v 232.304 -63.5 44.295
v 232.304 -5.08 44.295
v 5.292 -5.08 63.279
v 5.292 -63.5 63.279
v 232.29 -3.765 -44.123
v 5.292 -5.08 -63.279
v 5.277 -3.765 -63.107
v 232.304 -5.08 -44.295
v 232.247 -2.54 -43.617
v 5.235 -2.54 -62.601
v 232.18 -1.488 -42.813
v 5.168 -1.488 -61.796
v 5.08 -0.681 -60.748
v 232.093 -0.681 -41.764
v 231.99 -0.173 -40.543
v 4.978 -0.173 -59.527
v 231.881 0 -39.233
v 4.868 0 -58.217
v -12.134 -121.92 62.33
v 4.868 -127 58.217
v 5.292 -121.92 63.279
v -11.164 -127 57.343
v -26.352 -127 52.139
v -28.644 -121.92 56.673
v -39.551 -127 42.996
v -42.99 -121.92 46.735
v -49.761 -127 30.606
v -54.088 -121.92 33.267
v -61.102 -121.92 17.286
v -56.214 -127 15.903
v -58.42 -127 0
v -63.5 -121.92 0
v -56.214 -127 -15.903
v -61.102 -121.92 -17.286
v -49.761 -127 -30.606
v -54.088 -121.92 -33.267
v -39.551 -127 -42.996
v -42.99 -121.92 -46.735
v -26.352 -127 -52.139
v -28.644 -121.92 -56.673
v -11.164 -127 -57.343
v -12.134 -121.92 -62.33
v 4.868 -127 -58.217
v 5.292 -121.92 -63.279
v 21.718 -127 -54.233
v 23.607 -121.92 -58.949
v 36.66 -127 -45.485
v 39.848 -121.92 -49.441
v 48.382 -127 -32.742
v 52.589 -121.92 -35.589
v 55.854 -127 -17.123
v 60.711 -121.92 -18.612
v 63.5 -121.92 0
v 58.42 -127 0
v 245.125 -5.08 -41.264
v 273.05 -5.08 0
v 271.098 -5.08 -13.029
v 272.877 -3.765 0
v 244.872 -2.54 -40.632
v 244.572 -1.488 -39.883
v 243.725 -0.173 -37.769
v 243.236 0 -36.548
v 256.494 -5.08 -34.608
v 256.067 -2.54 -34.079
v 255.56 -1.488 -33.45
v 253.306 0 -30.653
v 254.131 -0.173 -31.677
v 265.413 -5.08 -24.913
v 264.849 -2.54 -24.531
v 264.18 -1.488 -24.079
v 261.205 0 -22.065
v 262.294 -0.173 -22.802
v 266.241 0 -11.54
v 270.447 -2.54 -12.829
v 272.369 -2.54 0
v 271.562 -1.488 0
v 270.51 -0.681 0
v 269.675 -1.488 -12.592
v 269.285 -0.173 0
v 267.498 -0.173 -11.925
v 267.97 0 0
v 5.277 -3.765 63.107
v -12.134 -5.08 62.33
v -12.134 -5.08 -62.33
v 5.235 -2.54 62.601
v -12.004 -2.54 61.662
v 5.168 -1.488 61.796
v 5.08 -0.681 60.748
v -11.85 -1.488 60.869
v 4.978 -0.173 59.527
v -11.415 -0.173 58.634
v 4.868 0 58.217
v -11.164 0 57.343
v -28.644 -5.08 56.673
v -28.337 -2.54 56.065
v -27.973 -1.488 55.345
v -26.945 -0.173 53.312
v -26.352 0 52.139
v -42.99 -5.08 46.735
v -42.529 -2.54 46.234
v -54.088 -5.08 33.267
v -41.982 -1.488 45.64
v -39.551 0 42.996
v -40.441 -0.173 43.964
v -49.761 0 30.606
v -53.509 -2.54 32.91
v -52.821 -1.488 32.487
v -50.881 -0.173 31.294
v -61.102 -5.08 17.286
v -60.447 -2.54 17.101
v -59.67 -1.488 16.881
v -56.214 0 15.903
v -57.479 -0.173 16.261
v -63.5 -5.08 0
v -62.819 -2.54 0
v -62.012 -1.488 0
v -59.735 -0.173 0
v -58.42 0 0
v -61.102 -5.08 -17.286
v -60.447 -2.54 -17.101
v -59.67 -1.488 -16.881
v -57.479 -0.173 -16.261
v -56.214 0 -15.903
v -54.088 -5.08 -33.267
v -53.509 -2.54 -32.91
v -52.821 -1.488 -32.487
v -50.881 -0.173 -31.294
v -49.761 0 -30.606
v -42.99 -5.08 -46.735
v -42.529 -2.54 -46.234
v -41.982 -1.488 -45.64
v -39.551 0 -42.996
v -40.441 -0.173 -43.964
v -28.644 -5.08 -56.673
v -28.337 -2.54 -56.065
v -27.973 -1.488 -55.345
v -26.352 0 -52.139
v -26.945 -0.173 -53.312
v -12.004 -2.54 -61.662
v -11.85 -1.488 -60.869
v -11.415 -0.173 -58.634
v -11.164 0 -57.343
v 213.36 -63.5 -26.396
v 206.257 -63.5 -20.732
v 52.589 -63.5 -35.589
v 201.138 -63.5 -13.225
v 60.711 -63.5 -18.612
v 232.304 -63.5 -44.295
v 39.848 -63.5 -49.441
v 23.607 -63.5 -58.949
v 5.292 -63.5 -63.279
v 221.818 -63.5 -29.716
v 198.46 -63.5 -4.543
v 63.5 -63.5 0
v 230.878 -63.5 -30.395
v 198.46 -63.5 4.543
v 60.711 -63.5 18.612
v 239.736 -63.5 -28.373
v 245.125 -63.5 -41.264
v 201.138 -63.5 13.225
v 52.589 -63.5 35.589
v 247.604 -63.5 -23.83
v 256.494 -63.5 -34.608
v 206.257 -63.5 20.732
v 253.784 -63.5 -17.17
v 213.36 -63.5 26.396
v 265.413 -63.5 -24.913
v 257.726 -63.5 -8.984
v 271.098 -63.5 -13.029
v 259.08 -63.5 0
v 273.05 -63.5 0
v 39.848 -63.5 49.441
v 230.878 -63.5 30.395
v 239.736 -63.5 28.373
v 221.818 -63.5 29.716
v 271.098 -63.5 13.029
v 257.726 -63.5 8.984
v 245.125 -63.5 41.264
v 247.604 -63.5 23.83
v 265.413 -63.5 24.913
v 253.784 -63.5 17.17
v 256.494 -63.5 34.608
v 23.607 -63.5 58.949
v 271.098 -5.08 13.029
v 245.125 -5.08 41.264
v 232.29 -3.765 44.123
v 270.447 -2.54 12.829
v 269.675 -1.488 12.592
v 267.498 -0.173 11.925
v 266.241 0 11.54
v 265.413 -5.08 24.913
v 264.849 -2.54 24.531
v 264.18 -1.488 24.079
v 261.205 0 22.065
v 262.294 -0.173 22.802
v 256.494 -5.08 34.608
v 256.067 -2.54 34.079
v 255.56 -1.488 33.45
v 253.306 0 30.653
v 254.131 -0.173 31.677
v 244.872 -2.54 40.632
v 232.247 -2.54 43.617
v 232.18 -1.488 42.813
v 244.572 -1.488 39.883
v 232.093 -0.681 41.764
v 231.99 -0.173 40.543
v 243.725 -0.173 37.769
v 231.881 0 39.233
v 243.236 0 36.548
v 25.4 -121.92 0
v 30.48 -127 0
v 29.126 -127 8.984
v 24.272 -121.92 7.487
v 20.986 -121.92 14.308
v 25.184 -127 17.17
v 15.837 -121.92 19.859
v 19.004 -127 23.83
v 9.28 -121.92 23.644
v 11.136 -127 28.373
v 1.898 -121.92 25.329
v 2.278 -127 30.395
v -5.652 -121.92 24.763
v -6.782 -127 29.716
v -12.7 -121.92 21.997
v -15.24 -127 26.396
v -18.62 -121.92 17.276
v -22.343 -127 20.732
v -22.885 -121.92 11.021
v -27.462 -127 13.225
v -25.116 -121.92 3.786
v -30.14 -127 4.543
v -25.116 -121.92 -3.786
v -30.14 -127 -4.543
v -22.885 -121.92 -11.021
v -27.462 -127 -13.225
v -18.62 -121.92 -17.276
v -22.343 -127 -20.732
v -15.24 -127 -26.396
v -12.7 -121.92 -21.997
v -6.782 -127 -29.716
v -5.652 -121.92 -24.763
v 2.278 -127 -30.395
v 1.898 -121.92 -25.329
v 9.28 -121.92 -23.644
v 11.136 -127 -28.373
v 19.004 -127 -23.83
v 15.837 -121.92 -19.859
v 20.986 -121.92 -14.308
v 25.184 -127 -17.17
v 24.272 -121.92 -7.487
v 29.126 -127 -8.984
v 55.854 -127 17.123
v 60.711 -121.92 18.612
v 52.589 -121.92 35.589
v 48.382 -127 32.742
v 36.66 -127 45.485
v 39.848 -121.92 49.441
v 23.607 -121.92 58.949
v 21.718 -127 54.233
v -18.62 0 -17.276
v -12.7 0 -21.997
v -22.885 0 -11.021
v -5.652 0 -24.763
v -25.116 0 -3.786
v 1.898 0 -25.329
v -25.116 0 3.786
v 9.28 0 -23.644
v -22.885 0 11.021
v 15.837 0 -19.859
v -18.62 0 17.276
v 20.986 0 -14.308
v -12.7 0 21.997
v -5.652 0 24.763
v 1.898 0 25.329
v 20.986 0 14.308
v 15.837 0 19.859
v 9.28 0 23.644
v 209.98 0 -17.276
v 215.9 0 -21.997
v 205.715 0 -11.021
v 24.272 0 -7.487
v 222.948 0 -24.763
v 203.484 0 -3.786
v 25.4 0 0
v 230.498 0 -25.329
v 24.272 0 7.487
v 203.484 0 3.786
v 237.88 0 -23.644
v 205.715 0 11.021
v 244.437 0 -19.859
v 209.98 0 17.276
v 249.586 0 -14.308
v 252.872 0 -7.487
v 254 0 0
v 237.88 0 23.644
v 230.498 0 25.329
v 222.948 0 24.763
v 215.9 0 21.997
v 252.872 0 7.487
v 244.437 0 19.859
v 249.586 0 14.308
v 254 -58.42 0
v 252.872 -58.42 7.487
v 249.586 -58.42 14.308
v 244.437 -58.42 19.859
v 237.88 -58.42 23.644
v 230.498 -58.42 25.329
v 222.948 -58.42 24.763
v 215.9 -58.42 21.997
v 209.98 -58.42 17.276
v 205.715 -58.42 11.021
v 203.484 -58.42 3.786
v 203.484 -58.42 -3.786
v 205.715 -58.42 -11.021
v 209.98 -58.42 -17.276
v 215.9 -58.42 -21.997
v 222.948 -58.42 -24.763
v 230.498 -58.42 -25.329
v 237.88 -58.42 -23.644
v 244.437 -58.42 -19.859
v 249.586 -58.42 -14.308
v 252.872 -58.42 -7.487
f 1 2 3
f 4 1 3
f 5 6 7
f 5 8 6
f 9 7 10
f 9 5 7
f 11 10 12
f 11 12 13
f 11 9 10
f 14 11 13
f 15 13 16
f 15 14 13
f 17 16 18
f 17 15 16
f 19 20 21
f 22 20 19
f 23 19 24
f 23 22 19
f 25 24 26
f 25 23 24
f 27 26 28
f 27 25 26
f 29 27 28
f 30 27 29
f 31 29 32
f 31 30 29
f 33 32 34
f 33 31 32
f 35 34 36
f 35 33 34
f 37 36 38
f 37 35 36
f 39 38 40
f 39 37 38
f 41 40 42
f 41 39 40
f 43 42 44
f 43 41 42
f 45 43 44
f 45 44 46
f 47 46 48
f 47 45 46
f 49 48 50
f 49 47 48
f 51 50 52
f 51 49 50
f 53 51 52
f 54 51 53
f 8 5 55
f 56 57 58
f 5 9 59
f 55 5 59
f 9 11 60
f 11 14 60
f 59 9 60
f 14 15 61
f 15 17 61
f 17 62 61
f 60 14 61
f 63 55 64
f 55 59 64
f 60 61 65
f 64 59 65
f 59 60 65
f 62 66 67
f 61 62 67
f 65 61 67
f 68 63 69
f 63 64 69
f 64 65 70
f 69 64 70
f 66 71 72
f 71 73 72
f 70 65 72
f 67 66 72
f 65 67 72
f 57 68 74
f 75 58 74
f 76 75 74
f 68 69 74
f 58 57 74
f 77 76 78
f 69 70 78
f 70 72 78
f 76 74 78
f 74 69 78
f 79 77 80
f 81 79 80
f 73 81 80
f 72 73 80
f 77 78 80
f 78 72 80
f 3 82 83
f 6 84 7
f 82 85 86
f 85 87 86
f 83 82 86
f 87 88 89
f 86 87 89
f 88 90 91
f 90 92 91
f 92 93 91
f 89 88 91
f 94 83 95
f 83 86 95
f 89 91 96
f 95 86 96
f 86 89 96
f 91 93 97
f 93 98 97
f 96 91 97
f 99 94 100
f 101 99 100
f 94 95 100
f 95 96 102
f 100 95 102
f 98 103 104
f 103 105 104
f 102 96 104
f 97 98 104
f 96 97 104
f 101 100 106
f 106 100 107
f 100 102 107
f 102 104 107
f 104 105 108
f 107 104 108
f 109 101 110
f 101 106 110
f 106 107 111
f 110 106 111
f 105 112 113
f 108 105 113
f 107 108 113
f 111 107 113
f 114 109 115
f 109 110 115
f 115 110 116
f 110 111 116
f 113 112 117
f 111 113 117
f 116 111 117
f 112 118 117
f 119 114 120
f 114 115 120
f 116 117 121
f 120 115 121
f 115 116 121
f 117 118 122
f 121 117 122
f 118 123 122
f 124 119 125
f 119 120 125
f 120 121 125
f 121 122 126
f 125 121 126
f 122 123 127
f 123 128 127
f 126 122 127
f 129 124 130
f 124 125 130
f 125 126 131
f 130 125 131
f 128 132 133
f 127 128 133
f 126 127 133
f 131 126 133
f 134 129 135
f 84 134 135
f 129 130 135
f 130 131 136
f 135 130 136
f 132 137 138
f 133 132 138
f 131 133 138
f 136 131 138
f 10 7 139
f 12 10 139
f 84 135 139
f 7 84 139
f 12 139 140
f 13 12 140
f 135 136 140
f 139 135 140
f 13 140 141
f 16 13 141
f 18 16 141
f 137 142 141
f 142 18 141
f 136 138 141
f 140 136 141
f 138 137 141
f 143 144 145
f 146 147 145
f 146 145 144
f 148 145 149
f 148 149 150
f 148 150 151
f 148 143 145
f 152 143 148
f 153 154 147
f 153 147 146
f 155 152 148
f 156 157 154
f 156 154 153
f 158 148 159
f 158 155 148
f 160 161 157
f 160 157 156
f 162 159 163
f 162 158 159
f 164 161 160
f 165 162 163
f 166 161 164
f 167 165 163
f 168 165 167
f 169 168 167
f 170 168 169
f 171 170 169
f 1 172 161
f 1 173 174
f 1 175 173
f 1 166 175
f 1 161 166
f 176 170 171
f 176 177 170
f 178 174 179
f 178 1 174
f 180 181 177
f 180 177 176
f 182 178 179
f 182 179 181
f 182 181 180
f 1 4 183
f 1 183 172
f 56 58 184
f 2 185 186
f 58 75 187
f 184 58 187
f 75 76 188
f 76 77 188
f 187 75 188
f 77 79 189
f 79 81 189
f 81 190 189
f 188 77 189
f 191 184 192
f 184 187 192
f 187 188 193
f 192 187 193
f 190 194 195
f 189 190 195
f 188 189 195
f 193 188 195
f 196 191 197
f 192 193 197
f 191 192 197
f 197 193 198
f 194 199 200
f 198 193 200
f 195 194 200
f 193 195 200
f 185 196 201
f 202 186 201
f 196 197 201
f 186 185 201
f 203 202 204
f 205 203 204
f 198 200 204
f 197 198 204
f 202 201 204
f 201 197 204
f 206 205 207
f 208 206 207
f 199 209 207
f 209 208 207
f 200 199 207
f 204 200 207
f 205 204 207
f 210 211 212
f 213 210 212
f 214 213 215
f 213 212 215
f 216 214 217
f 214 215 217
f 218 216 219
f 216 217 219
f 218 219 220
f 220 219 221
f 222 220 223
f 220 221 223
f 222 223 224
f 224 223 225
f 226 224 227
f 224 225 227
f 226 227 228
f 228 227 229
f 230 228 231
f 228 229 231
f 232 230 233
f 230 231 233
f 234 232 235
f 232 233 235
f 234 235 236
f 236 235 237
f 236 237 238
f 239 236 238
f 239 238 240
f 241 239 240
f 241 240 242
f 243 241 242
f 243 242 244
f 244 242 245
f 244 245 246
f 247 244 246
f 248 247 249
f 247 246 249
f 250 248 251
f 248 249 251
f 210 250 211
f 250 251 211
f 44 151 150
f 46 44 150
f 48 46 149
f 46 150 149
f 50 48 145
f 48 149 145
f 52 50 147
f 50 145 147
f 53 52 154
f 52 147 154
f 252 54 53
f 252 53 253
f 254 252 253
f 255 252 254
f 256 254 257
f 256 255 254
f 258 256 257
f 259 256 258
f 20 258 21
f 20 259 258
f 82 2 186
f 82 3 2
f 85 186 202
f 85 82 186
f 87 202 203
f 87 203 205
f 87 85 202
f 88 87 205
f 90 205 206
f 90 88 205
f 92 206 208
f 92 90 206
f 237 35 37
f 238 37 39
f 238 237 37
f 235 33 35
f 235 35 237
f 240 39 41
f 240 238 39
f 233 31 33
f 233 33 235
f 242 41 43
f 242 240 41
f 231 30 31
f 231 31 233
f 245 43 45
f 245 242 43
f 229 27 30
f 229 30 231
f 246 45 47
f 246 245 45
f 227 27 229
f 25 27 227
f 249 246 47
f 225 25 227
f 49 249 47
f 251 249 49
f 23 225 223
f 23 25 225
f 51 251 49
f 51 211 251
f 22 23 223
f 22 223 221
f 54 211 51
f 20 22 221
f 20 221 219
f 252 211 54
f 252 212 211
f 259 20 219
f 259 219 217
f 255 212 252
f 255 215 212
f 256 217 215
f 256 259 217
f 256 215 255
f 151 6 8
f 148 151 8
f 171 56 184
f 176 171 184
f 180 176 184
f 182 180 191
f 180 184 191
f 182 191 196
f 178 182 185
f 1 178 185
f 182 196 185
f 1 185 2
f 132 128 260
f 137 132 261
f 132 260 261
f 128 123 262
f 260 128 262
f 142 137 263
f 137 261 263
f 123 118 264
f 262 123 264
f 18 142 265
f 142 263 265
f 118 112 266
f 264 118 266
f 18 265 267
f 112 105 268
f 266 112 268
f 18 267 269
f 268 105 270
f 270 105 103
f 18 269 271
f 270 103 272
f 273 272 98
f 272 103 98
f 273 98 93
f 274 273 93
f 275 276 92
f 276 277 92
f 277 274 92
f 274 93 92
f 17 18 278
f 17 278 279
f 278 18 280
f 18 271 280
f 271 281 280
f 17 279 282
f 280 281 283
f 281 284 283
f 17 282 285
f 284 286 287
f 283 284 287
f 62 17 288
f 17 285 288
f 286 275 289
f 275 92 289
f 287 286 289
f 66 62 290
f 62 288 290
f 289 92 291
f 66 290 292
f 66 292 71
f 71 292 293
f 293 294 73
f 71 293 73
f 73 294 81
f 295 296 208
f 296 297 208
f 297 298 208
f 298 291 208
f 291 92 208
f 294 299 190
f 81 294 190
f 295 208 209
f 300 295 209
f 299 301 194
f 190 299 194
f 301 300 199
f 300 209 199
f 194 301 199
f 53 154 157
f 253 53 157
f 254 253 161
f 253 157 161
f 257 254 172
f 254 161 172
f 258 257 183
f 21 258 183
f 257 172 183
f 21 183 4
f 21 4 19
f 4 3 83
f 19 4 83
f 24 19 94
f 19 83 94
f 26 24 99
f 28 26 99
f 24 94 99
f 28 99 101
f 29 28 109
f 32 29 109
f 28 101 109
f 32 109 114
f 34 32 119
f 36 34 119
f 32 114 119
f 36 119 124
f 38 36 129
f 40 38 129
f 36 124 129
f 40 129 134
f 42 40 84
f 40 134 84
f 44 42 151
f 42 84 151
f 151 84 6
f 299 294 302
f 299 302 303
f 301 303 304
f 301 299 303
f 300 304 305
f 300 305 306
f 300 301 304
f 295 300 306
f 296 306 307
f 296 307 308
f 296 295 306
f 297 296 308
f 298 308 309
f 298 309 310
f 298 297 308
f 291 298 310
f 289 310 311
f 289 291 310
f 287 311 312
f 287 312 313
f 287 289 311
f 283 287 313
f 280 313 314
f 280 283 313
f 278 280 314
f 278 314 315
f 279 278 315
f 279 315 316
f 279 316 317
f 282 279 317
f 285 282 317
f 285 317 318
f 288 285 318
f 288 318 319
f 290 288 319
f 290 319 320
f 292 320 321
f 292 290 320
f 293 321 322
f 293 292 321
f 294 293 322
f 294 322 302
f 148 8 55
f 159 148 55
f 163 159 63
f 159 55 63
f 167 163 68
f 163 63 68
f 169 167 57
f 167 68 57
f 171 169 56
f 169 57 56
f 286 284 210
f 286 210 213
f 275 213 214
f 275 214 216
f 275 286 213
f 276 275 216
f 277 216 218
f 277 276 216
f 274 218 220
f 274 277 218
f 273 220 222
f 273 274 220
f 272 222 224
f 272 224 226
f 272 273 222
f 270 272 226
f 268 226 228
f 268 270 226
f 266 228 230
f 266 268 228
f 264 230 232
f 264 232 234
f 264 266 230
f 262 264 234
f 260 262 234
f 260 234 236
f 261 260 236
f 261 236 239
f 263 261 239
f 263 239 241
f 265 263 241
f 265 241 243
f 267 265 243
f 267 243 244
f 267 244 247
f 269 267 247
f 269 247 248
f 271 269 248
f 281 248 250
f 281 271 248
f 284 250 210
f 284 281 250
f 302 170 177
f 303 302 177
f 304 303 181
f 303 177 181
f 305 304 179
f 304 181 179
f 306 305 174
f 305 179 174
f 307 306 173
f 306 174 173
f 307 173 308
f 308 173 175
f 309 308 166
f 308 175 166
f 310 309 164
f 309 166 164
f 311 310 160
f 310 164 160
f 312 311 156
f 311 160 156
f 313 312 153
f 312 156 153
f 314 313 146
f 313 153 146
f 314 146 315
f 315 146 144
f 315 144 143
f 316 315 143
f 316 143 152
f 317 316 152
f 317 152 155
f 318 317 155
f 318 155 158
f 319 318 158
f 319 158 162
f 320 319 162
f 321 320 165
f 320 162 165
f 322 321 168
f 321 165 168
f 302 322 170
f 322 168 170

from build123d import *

# Parameters (mm, degrees)
F0_R     = 25.4
F1_DEPTH = 63.5
F2_DEPTH = 127
F3_SIZE  = 5.08
F4_R     = 5.08


with BuildPart() as f1:
    # F0 (on Front) → F1 (new body)
    with BuildSketch(Plane.XZ):
        with BuildLine():
            ThreePointArc((5.291667, -63.27913), (46.734735, -42.989703), (63.5, 0))
            ThreePointArc((63.5, 0), (46.734735, 42.989703), (5.291667, 63.27913))
            ThreePointArc((5.291667, 63.27913), (-63.5, 0), (5.291667, -63.27913))
        make_face()
        Circle(F0_R, mode=Mode.SUBTRACT)
        with BuildLine():
            ThreePointArc((5.291667, 63.27913), (46.734735, 42.989703), (63.5, 0))
            ThreePointArc((63.5, 0), (46.734735, -42.989703), (5.291667, -63.27913))
            Line((5.291667, -63.27913), (232.304167, -44.295391))
            ThreePointArc((232.304167, -44.295391), (184.15, 0), (232.304167, 44.295391))
            Line((232.304167, 44.295391), (5.291667, 63.27913))
        make_face()
        with BuildLine():
            ThreePointArc((273.05, 0), (261.314314, 30.092792), (232.304167, 44.295391))
            ThreePointArc((232.304167, 44.295391), (184.15, 0), (232.304167, -44.295391))
            ThreePointArc((232.304167, -44.295391), (261.314314, -30.092792), (273.05, 0))
        make_face()
        with Locations((228.6, 0)):
            Circle(F0_R, mode=Mode.SUBTRACT)
    extrude(amount=F1_DEPTH)

    # F0 (on Front) → F2 (join)
    with BuildSketch(Plane.XZ):
        with BuildLine():
            ThreePointArc((5.291667, -63.27913), (46.734735, -42.989703), (63.5, 0))
            ThreePointArc((63.5, 0), (46.734735, 42.989703), (5.291667, 63.27913))
            ThreePointArc((5.291667, 63.27913), (-63.5, 0), (5.291667, -63.27913))
        make_face()
        Circle(F0_R, mode=Mode.SUBTRACT)
    extrude(amount=F2_DEPTH)

    # F3
    f3_edges = [f1.edges().sort_by_distance(p)[0] for p in [
        (-25.4, -127, 0),
        (-5.291667, -127, 63.27913),
        (203.2, -63.5, 0),
    ]]
    chamfer(f3_edges, length=F3_SIZE)

    # F4
    f4_edges = [f1.edges().sort_by_distance(p)[0] for p in [
        (118.797917, 0, 53.78726),
        (118.797917, 0, -53.78726),
        (-63.5, 0, 0),
        (273.05, 0, 0),
    ]]
    fillet(f4_edges, radius=F4_R)


solid = f1.part
